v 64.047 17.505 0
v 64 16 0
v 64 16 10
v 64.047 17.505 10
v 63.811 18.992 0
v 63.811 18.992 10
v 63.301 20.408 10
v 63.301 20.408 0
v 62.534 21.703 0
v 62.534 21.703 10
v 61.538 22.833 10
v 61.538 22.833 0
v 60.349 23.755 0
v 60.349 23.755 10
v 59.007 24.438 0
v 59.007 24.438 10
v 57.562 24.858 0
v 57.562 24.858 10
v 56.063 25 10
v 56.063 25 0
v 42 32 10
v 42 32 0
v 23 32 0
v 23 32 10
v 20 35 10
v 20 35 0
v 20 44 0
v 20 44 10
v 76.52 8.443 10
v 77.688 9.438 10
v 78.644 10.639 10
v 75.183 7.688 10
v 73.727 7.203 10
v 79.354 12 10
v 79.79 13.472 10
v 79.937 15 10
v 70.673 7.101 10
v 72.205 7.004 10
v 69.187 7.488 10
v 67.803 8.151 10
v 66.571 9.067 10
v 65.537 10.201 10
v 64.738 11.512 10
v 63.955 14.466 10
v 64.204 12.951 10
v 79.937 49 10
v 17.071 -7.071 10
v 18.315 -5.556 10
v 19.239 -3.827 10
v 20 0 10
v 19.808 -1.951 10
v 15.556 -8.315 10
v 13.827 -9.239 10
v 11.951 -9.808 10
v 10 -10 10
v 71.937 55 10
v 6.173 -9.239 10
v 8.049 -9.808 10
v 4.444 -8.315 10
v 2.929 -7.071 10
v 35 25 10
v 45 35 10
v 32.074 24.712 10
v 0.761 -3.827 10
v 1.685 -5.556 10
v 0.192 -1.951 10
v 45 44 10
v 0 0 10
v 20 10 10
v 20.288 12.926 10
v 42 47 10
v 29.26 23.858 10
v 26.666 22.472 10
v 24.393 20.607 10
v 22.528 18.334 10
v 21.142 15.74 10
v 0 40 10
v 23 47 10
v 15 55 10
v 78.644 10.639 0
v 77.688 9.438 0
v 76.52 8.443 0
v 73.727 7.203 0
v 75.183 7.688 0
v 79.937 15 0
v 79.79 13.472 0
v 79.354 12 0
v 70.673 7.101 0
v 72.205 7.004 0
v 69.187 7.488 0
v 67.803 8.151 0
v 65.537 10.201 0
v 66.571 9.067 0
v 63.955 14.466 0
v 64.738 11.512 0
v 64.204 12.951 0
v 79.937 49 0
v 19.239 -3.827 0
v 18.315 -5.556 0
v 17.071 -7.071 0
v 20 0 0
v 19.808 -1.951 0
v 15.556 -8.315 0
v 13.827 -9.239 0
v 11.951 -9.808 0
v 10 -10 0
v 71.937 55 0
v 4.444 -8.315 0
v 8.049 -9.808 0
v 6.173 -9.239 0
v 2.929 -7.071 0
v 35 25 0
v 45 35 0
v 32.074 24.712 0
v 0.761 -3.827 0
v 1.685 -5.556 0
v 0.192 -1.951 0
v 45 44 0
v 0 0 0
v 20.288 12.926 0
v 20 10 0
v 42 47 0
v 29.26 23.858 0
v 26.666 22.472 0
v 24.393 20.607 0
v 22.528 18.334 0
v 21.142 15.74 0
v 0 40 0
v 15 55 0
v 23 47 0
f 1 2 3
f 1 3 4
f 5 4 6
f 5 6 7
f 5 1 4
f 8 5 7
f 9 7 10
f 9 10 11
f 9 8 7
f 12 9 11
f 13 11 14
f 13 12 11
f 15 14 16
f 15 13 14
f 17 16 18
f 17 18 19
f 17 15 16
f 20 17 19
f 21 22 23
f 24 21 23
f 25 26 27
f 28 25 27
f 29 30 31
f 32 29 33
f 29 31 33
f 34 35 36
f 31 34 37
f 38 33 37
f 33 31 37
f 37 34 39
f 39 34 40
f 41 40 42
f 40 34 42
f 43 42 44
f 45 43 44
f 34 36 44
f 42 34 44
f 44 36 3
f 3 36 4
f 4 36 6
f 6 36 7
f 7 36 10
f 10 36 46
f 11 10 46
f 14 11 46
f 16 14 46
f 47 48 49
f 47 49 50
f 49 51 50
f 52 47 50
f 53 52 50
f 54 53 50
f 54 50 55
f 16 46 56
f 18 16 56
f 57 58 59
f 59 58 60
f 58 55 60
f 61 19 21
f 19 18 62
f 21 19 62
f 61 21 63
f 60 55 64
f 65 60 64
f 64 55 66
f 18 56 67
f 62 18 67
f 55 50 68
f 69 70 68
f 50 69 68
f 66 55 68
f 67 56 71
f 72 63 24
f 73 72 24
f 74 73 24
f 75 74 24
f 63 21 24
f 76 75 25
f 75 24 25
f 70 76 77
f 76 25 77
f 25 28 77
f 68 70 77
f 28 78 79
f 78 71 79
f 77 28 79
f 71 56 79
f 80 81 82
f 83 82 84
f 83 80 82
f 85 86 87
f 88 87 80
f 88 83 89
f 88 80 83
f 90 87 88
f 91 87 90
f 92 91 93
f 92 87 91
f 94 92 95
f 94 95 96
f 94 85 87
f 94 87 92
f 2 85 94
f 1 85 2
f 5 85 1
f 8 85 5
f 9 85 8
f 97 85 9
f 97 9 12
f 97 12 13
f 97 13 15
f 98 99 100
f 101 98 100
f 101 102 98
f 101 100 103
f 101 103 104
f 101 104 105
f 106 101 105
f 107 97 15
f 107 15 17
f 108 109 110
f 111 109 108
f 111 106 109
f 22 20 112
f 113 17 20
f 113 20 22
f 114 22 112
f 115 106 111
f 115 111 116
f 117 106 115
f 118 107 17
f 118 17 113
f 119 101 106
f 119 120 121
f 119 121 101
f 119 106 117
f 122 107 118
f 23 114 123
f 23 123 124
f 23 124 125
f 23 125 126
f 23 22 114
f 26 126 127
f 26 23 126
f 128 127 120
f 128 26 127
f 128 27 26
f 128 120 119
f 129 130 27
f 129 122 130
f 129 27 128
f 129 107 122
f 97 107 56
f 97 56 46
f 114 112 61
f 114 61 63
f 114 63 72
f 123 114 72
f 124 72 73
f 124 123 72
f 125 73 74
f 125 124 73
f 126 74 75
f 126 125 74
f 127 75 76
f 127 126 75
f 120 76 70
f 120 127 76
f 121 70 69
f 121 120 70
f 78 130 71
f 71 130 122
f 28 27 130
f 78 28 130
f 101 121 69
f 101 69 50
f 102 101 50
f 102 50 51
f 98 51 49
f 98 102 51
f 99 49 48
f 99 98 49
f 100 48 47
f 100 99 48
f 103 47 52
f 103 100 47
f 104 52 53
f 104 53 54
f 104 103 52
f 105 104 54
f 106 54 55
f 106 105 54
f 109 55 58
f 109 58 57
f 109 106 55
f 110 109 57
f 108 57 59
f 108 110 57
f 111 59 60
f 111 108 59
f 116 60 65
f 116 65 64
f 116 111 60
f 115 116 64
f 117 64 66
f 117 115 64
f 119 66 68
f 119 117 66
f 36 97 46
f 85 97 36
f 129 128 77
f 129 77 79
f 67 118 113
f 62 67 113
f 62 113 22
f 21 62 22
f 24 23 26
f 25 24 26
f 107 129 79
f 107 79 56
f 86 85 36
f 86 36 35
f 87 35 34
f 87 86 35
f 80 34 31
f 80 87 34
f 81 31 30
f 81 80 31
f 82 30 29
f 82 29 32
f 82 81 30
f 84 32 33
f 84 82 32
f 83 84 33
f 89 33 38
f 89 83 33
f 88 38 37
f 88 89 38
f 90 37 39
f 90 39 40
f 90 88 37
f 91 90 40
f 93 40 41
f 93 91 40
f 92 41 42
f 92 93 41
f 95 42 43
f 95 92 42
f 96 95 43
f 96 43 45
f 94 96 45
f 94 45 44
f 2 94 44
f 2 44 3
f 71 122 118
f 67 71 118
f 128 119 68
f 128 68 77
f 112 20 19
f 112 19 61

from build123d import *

# Parameters (mm, degrees)
SALIENTE_EXTRUIR1_DEPTH = 10


with BuildPart() as part:
    # Croquis1 → Saliente-Extruir1 (new body)
    with BuildSketch(Plane.XY):
        with BuildLine():
            Line((0, 0), (0, 40))
            Line((0, 40), (15, 55))
            Line((15, 55), (71.937253933, 55))
            Line((71.937253933, 55), (79.937253933, 49))
            Line((79.937253933, 49), (79.937253933, 15))
            ThreePointArc((79.937253933, 15), (71.436270633, 7.015701926), (64, 16))
            ThreePointArc((64, 16), (62.062746067, 22.291502622), (56.062746067, 25))
            Line((56.062746067, 25), (35, 25))
            ThreePointArc((35, 25), (24.393398282, 20.606601718), (20, 10))
            Line((20, 10), (20, 0))
            ThreePointArc((20, 0), (10, -10), (0, 0))
        make_face()
        Polygon((20, 44), (23, 47), (42, 47), (45, 44), (45, 35), (42, 32), (23, 32), (20, 35), align=None, mode=Mode.SUBTRACT)
    extrude(amount=SALIENTE_EXTRUIR1_DEPTH)


solid = part.part
